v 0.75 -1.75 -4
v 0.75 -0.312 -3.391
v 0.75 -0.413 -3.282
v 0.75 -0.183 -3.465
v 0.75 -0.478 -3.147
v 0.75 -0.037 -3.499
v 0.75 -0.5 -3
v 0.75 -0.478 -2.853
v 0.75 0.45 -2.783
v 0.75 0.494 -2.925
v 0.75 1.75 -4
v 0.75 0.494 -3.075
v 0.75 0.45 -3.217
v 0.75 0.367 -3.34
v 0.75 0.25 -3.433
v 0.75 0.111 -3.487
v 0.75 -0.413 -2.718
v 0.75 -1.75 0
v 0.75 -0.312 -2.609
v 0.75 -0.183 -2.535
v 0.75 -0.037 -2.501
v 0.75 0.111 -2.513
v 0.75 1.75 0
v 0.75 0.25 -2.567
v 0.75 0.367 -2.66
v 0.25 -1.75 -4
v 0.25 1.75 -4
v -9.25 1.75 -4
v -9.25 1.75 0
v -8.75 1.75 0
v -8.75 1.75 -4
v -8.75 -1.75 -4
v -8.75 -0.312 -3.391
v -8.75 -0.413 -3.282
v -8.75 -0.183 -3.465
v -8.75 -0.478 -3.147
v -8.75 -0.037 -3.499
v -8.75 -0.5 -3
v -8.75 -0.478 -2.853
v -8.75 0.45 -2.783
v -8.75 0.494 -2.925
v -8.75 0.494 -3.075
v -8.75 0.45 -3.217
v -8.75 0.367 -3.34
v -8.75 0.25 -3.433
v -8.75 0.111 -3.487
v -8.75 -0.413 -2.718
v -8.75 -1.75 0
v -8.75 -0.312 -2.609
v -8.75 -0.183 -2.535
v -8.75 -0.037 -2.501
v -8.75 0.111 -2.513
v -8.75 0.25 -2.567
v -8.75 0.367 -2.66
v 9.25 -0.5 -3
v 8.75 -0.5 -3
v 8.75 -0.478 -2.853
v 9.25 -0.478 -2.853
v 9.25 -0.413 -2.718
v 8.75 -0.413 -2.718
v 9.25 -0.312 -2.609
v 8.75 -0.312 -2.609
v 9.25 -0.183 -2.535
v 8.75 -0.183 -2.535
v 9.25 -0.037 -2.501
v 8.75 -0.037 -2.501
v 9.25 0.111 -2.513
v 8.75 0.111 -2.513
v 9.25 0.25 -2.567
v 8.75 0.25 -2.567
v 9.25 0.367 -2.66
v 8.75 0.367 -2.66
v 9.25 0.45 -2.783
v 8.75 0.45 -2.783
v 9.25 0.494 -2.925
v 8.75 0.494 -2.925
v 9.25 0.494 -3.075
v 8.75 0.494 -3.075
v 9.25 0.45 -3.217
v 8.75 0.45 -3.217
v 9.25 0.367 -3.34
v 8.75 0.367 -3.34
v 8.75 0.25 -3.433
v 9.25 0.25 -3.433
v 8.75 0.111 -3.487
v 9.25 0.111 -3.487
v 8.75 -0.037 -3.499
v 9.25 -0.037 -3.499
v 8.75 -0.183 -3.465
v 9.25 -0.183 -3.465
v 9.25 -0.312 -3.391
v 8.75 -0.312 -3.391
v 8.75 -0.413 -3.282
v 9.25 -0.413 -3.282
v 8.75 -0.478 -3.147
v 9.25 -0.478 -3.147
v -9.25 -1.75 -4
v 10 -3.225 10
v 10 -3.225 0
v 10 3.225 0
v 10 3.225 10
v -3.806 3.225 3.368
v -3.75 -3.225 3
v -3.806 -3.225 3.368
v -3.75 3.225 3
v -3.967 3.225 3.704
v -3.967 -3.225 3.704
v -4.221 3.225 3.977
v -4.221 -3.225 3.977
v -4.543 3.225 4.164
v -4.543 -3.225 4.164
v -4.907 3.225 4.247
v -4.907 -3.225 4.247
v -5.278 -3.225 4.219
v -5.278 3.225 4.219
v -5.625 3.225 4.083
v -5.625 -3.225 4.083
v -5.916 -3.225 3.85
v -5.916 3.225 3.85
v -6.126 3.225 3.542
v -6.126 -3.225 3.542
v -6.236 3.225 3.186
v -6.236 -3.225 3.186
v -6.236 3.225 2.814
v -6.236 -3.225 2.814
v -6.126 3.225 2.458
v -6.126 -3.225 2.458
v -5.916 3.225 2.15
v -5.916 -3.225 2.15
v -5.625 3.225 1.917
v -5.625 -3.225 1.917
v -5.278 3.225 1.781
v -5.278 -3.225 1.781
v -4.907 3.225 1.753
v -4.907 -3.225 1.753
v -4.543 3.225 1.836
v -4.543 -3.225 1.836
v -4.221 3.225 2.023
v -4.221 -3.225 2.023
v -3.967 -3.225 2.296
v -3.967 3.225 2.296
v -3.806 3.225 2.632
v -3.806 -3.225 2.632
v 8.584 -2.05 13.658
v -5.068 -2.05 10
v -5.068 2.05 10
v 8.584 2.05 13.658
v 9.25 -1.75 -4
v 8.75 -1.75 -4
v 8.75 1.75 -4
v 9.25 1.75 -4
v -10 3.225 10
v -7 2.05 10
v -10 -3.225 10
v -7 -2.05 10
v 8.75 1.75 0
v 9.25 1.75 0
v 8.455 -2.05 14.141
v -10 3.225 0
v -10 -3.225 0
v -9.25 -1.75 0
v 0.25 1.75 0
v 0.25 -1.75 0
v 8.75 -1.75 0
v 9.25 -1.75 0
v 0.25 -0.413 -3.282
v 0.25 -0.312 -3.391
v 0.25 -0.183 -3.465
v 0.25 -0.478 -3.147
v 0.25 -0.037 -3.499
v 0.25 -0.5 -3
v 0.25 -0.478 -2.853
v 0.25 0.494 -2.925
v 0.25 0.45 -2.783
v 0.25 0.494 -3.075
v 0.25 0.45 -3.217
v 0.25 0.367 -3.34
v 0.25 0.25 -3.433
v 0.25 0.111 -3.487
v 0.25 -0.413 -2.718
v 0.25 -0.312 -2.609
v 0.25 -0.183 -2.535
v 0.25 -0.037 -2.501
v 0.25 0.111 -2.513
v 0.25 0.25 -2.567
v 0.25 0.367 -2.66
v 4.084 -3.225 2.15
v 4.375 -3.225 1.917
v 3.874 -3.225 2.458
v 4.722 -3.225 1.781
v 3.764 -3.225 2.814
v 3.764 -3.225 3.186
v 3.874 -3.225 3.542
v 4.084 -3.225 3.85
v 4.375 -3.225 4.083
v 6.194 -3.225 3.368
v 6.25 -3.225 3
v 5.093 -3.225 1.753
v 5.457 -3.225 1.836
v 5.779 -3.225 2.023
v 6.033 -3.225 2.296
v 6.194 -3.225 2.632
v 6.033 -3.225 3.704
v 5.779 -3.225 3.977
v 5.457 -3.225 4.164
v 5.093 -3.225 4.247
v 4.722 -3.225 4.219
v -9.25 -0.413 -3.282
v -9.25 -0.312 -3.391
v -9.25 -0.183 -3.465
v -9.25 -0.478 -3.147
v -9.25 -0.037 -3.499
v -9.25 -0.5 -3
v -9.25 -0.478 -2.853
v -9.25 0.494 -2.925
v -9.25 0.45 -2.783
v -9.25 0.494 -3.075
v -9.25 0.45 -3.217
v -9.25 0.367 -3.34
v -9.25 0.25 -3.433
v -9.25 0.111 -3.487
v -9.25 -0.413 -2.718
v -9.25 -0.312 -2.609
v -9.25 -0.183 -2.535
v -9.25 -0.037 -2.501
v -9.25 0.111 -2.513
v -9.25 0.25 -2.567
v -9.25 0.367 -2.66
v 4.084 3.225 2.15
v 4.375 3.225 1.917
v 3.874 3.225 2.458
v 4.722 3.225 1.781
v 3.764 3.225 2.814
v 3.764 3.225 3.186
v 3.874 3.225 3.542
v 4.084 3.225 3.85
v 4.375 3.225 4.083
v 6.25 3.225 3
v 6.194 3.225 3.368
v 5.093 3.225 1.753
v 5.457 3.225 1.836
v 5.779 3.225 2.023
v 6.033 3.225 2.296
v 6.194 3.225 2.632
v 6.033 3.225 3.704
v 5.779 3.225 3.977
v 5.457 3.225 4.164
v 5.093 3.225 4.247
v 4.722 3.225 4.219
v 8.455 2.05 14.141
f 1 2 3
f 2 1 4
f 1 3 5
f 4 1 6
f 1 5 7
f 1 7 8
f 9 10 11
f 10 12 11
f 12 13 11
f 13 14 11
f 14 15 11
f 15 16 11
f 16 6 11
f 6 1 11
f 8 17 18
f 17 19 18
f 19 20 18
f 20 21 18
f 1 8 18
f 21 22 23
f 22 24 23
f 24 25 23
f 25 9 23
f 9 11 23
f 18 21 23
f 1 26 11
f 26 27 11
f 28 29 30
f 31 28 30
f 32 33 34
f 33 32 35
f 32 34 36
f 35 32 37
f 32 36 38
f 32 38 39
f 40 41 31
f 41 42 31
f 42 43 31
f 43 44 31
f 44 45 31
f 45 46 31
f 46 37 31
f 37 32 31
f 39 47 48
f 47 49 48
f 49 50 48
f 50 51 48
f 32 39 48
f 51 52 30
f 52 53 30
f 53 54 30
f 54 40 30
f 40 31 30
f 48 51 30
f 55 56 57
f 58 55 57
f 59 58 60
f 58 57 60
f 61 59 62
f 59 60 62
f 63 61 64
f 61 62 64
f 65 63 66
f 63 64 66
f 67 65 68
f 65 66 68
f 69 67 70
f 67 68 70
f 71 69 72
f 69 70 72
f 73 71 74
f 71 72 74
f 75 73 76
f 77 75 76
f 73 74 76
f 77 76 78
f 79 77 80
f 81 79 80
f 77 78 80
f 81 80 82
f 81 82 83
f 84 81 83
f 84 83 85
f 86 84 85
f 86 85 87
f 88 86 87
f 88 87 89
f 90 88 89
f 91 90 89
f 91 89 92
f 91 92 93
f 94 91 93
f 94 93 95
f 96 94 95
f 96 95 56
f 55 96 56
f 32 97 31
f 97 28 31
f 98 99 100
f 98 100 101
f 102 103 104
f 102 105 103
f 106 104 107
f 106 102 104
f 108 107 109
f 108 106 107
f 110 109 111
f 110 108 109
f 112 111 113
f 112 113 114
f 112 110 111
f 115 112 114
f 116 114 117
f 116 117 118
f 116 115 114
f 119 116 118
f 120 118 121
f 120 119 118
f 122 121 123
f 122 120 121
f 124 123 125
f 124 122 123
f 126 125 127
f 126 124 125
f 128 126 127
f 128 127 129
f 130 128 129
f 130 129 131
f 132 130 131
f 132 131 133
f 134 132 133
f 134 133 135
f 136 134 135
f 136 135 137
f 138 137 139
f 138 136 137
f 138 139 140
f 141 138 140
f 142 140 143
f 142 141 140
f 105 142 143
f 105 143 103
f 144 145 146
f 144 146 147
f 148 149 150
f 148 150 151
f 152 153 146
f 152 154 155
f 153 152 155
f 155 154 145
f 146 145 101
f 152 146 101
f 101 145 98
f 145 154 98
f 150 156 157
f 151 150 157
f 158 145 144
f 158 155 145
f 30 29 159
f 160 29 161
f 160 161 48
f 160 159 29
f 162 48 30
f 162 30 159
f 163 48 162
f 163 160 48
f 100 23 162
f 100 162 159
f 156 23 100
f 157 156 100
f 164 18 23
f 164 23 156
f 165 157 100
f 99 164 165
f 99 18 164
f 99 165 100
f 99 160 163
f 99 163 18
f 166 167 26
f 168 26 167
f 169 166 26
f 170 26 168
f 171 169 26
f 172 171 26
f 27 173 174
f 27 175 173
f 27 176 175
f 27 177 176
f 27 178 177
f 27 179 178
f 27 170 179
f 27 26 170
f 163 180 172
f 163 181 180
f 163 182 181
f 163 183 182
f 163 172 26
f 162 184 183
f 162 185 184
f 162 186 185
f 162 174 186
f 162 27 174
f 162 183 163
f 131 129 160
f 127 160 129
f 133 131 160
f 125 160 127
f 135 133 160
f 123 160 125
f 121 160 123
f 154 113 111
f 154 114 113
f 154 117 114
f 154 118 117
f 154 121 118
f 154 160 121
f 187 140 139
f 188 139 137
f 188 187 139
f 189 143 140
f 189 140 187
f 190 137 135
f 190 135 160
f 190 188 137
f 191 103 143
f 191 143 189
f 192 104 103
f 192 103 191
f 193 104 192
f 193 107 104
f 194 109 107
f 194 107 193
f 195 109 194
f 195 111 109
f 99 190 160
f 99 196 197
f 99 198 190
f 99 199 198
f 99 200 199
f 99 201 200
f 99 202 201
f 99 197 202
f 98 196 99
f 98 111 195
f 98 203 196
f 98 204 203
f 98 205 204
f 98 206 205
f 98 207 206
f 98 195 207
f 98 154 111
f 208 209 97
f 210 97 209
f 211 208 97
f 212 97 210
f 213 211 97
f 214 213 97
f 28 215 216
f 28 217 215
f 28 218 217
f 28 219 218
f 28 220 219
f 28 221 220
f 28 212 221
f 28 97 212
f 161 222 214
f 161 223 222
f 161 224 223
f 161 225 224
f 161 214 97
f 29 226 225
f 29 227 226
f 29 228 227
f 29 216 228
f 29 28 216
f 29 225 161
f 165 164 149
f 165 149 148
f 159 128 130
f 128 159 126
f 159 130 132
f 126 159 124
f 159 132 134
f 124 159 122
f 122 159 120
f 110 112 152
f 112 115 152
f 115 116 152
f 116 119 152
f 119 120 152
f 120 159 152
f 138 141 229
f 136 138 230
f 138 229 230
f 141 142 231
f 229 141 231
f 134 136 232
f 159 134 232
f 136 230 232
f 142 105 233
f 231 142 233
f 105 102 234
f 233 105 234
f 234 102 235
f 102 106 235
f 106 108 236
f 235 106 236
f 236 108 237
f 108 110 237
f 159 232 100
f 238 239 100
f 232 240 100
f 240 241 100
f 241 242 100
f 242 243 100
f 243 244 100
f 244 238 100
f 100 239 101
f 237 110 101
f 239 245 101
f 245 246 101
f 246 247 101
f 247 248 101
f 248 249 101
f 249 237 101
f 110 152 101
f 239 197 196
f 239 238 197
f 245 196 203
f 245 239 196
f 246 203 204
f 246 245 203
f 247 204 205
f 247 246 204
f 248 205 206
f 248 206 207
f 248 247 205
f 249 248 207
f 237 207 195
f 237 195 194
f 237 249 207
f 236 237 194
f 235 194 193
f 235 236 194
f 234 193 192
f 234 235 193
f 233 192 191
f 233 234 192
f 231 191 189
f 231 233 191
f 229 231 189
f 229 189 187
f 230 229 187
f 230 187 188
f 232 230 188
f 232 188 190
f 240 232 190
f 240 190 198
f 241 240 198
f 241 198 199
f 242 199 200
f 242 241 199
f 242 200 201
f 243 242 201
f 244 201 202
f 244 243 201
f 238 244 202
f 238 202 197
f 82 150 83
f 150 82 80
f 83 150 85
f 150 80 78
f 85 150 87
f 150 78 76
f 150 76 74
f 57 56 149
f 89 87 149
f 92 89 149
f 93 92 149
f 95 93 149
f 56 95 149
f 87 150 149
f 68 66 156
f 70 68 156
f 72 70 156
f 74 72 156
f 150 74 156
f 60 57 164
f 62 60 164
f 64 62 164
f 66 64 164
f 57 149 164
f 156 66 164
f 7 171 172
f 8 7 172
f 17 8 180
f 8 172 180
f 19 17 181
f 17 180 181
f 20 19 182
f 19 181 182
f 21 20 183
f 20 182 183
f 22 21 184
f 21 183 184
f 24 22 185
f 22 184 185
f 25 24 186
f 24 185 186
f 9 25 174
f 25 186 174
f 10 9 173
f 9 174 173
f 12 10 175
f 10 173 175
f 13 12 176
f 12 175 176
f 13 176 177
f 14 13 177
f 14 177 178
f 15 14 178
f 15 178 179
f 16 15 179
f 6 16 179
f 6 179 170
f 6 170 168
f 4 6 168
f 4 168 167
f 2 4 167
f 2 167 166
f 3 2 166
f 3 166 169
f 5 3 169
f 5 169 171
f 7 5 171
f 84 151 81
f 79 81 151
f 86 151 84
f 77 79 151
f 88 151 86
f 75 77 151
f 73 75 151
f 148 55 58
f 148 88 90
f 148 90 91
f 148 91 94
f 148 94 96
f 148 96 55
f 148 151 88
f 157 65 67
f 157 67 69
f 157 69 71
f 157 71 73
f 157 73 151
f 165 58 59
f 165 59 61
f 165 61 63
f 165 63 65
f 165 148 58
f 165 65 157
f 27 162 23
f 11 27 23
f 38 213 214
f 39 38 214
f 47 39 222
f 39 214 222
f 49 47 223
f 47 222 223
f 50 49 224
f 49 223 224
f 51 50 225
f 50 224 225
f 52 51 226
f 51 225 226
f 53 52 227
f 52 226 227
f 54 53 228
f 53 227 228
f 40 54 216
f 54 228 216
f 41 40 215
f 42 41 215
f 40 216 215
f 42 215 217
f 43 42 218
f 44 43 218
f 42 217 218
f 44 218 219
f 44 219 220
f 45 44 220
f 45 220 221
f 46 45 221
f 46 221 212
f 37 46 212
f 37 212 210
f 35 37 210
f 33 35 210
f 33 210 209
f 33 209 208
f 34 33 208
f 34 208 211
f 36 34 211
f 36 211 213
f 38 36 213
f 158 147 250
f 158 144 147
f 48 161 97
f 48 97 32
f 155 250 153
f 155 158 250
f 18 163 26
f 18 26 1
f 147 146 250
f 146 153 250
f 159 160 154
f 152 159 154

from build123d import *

# Parameters (mm, degrees)
F0_W     = 20
F0_H     = 10
F0_R     = 1.25
F1_DEPTH = 3.225
F3_DEPTH = 2.05
F4_W     = 0.5
F4_H     = 4
F5_DEPTH = 1.75
F6_R     = 0.5
F7_DEPTH = 19.251


with BuildPart() as f1:
    # F0 (on Front) → F1 (new body, symmetric)
    with BuildSketch(Plane.XZ):
        with Locations((0, 5)):
            Rectangle(F0_W, F0_H)
        with Locations((-5, 3)):
            Circle(F0_R, mode=Mode.SUBTRACT)
        with Locations((5, 3)):
            Circle(F0_R, mode=Mode.SUBTRACT)
    extrude(amount=F1_DEPTH, both=True)

    # F2 (on Front) → F3 (join, symmetric)
    with BuildSketch(Plane.XZ):
        Polygon((8.4548132206, 14.1411047216), (-7, 10), (-6.8705904774, 9.5170370869), (8.5842227432, 13.6581418085), align=None)
    extrude(amount=F3_DEPTH, both=True)

    # F4 (on Front) → F5 (join, symmetric)
    with BuildSketch(Plane.XZ):
        with Locations((-9, -2)):
            Rectangle(F4_W, F4_H)
        with Locations((0.5, -2)):
            Rectangle(F4_W, F4_H)
        with Locations((9, -2)):
            Rectangle(F4_W, F4_H)
    extrude(amount=F5_DEPTH, both=True)

    # F6 (on face) → F7 (cut, through all)
    with BuildSketch(Plane(origin=(-9.25, 0, 0), x_dir=(0, -1, 0), z_dir=(-1, 0, 0))):
        with Locations((0, -3)):
            Circle(F6_R)
    extrude(amount=-F7_DEPTH, mode=Mode.SUBTRACT)


solid = f1.part
